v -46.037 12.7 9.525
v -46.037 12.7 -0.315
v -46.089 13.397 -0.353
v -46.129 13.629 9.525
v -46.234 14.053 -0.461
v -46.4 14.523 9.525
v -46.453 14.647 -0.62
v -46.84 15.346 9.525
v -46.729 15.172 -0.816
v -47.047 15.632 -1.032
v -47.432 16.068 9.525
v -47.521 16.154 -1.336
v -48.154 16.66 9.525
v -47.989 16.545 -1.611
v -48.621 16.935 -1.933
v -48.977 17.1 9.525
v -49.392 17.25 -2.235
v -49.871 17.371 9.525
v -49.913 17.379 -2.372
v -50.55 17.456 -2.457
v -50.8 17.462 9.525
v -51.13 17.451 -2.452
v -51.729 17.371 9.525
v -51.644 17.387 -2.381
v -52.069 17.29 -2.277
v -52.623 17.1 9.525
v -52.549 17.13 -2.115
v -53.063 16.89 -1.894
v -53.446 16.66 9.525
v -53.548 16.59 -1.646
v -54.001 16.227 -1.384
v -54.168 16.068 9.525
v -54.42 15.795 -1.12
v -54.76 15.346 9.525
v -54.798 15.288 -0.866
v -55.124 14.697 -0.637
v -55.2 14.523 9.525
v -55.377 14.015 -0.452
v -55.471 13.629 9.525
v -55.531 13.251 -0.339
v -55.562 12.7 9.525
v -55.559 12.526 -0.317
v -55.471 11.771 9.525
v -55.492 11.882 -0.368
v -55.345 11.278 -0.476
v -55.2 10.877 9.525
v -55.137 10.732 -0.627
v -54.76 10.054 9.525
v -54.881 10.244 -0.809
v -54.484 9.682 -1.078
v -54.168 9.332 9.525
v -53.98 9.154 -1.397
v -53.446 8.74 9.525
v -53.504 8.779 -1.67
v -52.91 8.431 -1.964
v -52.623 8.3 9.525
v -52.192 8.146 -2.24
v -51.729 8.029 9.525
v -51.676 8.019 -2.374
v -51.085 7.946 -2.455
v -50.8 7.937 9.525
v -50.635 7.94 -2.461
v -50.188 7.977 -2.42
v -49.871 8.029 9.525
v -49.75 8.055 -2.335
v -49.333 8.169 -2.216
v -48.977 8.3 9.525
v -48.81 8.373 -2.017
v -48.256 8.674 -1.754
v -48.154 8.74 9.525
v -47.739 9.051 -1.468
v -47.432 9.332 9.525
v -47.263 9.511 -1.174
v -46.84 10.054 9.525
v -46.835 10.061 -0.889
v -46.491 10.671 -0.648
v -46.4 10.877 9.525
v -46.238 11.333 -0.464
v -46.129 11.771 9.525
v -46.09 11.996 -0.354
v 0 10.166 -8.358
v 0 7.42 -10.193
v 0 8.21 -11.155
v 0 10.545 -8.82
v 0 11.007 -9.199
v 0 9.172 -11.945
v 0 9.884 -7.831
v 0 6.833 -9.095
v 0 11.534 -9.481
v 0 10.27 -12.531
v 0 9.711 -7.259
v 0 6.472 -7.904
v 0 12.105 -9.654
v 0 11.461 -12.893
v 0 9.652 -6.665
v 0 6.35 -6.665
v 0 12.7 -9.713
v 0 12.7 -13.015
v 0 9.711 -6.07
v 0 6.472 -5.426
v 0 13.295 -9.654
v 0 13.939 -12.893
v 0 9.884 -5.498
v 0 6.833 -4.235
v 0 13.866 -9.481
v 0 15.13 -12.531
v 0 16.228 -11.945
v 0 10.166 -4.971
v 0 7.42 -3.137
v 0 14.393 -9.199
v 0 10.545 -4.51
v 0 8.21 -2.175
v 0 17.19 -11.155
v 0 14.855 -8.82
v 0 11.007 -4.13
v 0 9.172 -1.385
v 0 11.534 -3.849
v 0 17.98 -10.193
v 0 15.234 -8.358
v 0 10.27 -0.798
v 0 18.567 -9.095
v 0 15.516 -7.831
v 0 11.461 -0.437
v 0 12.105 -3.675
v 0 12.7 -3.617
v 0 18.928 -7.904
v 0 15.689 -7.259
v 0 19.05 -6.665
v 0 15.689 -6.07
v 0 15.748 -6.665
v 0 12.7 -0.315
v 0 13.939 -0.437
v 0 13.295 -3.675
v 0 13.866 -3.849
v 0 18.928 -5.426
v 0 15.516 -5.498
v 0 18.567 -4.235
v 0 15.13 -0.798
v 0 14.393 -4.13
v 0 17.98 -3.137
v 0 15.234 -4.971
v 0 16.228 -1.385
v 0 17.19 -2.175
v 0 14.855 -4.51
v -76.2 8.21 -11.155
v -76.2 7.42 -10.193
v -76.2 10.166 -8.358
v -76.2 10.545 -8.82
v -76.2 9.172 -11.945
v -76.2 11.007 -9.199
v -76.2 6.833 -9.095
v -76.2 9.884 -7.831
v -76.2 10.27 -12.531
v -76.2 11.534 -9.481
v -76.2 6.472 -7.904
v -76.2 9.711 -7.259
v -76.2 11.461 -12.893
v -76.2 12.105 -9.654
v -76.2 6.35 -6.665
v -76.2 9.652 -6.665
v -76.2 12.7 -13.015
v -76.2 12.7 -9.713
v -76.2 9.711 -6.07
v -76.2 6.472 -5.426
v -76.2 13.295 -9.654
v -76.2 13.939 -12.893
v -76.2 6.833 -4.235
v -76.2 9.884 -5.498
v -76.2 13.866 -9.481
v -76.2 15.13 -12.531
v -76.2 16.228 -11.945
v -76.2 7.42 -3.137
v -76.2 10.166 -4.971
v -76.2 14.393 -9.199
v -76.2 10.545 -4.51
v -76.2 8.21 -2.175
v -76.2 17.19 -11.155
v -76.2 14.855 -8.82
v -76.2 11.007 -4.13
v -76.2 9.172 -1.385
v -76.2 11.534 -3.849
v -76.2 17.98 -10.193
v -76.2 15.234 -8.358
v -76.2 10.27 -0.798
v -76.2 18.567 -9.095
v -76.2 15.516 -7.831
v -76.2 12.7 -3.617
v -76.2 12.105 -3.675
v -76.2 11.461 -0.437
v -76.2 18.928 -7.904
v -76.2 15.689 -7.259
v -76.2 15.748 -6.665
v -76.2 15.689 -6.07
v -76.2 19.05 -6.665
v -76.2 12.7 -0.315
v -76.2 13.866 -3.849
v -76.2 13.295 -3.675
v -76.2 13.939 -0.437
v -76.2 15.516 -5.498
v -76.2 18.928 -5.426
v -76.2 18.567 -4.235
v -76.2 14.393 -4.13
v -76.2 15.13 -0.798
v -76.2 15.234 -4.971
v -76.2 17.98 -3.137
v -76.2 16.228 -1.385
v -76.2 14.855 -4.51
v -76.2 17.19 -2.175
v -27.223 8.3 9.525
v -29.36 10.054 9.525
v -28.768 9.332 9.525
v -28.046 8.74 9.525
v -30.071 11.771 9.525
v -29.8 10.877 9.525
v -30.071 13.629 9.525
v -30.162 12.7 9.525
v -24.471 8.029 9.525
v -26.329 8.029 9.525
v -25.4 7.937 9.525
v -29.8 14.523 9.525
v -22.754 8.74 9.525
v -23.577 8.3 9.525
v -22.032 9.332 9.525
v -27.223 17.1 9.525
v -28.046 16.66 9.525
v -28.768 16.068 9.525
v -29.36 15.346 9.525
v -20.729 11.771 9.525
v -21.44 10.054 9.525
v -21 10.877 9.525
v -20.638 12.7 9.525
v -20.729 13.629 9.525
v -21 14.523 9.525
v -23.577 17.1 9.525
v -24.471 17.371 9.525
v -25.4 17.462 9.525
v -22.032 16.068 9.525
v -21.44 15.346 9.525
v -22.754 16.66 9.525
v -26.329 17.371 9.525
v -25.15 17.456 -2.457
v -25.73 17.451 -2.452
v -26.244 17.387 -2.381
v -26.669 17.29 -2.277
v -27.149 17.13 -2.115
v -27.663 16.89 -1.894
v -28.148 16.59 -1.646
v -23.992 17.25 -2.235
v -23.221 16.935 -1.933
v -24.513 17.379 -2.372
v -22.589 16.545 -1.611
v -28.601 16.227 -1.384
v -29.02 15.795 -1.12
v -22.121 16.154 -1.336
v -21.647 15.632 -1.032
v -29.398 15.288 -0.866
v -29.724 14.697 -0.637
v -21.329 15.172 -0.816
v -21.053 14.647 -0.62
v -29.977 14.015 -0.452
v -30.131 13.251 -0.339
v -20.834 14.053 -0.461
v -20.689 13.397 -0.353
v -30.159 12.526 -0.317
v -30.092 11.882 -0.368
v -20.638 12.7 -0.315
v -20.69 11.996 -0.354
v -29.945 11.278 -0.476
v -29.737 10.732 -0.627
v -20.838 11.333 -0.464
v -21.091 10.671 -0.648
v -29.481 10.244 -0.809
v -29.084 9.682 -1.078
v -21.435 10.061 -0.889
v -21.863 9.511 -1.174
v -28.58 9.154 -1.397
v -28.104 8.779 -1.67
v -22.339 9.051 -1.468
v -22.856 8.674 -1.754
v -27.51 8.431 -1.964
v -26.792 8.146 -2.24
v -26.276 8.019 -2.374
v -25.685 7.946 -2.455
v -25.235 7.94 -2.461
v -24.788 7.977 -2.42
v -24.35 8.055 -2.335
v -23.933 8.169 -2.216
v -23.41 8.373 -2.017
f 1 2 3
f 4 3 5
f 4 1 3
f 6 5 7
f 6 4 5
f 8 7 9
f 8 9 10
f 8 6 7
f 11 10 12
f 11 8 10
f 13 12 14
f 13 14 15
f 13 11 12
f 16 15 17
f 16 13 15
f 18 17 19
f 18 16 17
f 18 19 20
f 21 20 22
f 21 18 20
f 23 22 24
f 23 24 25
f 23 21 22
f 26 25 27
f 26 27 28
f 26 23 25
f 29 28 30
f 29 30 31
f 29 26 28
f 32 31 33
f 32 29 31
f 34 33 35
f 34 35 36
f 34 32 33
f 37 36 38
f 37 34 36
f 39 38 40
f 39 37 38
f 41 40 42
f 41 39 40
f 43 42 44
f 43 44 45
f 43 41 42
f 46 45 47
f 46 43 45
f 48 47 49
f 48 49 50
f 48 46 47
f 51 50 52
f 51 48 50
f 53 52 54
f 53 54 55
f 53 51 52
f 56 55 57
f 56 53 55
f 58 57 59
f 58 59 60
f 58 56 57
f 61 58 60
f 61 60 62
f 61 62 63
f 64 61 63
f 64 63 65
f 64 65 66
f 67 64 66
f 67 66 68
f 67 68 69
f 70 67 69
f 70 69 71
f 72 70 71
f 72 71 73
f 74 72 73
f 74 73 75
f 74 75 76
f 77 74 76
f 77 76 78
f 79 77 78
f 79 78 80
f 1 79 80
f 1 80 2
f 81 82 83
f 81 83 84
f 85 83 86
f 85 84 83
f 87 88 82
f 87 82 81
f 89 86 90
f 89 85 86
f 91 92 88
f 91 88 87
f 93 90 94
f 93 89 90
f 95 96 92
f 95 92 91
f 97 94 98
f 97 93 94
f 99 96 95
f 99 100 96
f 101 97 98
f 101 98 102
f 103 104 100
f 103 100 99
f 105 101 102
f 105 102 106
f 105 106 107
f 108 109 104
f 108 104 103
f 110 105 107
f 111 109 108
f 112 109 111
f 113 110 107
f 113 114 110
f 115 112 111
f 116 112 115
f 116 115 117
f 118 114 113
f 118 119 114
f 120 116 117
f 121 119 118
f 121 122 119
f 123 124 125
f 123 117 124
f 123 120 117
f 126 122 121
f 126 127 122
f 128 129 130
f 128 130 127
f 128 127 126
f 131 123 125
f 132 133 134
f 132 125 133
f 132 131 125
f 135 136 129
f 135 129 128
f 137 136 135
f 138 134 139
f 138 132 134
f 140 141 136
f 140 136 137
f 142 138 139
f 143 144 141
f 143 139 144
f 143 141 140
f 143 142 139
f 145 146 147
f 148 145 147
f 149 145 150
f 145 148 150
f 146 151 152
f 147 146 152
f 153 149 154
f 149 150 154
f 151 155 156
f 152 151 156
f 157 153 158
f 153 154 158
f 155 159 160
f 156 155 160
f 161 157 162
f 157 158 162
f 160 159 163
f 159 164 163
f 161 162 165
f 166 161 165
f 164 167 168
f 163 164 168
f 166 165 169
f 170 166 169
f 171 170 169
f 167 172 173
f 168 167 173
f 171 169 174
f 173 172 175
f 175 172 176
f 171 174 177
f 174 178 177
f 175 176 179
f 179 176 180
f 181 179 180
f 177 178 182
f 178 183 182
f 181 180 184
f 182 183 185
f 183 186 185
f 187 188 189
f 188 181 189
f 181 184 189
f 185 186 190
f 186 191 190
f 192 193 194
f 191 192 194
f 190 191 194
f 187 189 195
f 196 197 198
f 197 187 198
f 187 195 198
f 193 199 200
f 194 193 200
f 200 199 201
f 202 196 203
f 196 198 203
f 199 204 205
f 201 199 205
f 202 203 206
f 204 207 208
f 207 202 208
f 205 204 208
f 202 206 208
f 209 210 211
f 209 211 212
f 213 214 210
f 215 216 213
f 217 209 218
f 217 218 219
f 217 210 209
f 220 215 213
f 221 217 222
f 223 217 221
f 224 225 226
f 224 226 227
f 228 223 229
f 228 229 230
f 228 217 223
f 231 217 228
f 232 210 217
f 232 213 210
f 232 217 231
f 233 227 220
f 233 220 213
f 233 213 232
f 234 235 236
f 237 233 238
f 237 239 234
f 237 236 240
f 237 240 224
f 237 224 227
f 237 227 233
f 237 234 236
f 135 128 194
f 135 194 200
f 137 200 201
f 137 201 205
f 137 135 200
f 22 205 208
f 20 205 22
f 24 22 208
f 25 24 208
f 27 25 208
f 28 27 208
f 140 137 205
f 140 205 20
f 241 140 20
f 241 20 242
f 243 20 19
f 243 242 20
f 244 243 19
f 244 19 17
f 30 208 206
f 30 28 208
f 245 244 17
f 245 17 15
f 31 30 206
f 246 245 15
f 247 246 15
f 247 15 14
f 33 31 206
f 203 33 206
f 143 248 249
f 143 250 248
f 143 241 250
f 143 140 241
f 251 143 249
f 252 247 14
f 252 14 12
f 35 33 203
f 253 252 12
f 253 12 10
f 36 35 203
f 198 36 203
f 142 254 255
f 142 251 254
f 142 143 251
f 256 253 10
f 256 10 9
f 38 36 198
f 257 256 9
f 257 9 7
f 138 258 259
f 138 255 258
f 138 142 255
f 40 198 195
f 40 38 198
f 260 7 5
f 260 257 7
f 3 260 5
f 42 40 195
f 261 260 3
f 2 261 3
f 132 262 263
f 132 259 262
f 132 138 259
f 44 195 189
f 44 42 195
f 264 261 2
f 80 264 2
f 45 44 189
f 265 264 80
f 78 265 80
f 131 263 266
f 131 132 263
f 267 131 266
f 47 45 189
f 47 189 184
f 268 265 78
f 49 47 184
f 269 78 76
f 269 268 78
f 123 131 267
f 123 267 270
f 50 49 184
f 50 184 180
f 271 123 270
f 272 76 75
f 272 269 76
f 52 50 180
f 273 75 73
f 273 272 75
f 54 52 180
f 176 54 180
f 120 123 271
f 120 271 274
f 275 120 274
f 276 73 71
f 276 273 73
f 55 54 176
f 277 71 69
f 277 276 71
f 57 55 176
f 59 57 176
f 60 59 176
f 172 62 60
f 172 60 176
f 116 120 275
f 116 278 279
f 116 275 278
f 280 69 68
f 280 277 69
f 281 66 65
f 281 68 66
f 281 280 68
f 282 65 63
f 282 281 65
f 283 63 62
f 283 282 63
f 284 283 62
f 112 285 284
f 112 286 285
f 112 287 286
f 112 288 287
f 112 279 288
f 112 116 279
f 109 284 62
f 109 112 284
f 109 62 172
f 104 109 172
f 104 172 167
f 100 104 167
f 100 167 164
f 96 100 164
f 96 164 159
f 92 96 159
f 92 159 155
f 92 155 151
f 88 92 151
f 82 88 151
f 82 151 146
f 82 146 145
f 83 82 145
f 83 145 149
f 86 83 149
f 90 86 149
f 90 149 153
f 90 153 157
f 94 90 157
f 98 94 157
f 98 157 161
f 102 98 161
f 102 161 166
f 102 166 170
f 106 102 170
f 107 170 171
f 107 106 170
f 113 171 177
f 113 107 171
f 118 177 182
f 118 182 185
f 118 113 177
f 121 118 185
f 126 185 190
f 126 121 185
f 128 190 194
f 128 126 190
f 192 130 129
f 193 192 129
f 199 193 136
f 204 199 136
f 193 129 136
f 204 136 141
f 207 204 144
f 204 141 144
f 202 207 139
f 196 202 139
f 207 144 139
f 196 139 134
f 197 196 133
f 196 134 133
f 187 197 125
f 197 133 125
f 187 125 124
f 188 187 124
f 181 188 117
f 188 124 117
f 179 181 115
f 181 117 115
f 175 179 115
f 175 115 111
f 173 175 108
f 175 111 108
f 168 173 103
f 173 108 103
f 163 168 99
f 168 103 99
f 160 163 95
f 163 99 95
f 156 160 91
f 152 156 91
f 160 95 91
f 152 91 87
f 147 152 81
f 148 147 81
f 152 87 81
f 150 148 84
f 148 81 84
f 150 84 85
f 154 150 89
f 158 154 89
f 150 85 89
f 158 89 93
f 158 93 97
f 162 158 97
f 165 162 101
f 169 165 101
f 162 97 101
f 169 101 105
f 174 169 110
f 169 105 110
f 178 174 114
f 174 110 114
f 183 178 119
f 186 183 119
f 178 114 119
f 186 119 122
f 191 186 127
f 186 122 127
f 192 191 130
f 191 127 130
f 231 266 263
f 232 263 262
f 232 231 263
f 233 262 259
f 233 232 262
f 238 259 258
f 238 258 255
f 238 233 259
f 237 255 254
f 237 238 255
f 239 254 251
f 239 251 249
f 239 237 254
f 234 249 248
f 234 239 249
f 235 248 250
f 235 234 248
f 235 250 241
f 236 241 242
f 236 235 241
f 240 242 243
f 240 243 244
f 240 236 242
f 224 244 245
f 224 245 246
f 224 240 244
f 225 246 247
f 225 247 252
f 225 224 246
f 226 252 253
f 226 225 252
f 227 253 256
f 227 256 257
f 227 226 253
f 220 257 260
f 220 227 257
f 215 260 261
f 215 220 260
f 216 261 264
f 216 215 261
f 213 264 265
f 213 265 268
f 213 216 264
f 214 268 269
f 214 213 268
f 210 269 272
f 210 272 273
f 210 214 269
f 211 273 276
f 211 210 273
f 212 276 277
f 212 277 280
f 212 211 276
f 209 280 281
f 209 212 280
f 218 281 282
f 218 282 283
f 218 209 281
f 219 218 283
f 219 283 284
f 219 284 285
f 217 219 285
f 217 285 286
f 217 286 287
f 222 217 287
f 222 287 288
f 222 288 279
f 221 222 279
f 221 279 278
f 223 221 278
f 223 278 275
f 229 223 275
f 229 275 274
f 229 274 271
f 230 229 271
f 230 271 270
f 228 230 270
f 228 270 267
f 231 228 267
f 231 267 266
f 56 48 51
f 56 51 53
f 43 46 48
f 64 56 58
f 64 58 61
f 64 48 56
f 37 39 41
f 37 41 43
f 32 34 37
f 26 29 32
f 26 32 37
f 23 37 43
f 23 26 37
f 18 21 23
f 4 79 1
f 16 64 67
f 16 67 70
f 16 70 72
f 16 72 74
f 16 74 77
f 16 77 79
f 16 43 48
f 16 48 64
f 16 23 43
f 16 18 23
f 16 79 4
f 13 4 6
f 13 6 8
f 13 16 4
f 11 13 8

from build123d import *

# Parameters (mm, degrees)
F0_R          = 6.35
F1_DEPTH      = 76.2
F2_R          = 3.048
F3_DEPTH      = 76.2
F4_R          = 4.7625
F5_DEPTH      = 9.525
F5_DEPTH_BACK = 2.54


with BuildPart() as f1:
    # F0 (on Right) → F1 (new body)
    with BuildSketch(Plane.YZ):
        with Locations((12.7, -6.664779)):
            Circle(F0_R)
    extrude(amount=-F1_DEPTH)

    # F2 (on face) → F3 (cut, through all)
    with BuildSketch(Plane.YZ):
        with Locations((12.7, -6.664779)):
            Circle(F2_R)
    extrude(amount=-F3_DEPTH, mode=Mode.SUBTRACT)

    # F4 (on Top) → F5 (join, two sides)
    with BuildSketch(Plane.XY) as f5_sk:
        with Locations((-50.8, 12.7)):
            Circle(F4_R)
        with Locations((-25.4, 12.7)):
            Circle(F4_R)
    extrude(amount=F5_DEPTH)
    extrude(f5_sk.sketch, amount=-F5_DEPTH_BACK)


solid = f1.part
